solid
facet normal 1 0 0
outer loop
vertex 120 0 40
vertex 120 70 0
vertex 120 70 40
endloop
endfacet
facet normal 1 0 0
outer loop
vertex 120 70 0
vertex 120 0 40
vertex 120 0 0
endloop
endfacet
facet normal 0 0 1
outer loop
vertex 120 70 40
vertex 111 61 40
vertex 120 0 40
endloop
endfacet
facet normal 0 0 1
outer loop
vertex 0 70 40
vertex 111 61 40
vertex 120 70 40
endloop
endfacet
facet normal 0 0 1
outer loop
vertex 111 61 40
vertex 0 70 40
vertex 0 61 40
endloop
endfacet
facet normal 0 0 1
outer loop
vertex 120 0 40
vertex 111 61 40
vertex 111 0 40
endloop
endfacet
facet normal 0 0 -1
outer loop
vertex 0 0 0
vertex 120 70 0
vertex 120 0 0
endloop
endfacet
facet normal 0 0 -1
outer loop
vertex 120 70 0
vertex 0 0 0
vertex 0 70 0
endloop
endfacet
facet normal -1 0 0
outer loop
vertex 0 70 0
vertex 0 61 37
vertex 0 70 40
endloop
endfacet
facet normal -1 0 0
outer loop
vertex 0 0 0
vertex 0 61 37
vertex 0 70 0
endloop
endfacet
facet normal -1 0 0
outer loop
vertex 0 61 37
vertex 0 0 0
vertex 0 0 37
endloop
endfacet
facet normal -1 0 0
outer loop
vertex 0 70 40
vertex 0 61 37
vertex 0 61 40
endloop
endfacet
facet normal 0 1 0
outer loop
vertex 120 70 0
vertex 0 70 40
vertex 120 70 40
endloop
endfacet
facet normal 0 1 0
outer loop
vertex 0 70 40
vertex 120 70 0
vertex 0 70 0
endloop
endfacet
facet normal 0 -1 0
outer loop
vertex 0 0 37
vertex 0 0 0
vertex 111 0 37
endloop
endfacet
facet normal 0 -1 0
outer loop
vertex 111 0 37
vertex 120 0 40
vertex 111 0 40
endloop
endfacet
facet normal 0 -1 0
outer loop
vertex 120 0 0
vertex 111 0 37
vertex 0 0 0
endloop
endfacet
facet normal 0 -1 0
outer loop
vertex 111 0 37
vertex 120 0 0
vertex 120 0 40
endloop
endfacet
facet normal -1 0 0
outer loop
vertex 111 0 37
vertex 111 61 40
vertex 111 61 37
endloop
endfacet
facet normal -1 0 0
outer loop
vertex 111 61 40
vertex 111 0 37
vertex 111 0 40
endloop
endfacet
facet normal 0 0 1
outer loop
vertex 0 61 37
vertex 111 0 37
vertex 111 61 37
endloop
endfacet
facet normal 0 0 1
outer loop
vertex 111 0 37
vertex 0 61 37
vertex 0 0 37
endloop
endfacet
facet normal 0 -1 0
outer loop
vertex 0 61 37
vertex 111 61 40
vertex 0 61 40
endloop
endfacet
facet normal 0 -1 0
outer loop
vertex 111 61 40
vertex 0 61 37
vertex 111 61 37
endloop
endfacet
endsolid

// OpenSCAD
// Buffer Tank for Mini Horizontal Gel Electrophoresis
// Units: millimetres

// Outer Dimensions (Specified)
$w_outer = 120; // Width (X)
$d_outer = 70;  // Depth (Y)
$h_outer = 40;  // Height (Z)

// Wall and Floor Thickness
$wall_thick = 3;
$floor_thick = 3;

// Platform Dimensions
$plat_len = 60;   // Length in X
$plat_height = 10; // Height above inner floor (Total height from bed = 3 + 10 = 13)

// Hole Dimensions
$hole_dia = 2;
$hole_y = 0;
$hole_z = 30;

// Configuration
$fn = 128; // High resolution for smooth curves

// Derived Dimensions
$w_inner = $w_outer - 2*$wall_thick;
$d_inner = $d_outer - 2*$wall_thick;
$h_inner = $h_outer - $floor_thick;

// Main Tank Body (Open Top)
// Constructed by taking a solid block and subtracting the top opening.
// The tank rests on the bed at Z=0.
difference() {
    // 1. Solid Block (Outer Dimensions)
    cube([
        $w_outer, 
        $d_outer, 
        $h_outer
    ]);
    
    // 2. Cut out the top opening
    // The opening is the inner dimensions.
    // It starts at the top of the tank (h_outer) and goes down to the top of the floor (floor_thick).
    translate([
        -$wall_thick, 
        -$wall_thick, 
        $h_outer - $floor_thick
    ])
    cube([
        $w_inner, 
        $d_inner, 
        $floor_thick
    ]);
}

// Platform (Raised in the middle)
// Positioned relative to the tank body.
// It sits on the floor (Z=0) and is 10mm high.
// Top of platform is at Z=10.
// Spec says "top is 10 mm above the inner floor". Inner floor is at Z=3. So top is at Z=13?
// Re-reading spec: "its top is 10 mm above the inner floor (at z = 13)".
// This implies the inner floor is at Z=3 (3mm thick). 
// If the platform is 10mm high, its top is at 3 + 10 = 13.
// My previous logic was correct about the height, but the placement in the previous code was wrong.
// The platform sits on the bed (Z=0). Its height is 10mm. Its top is at Z=10.
// Wait, the spec says "top is 10 mm above the inner floor (at z = 13)".
// This implies the platform height is 10mm, and the inner floor is at Z=3.
// So the platform sits on the inner floor? No, that would make it float.
// Standard interpretation: The platform is a solid piece sitting on the bed.
// If the platform top is at Z=13, and the floor is 3mm thick, the platform height is 10mm.
// So the platform sits on Z=0, goes up to Z=10? No, that puts top at 10.
// If the platform top is at Z=13, the platform height must be 13mm?
// Let's re-read carefully: "its top is 10 mm above the inner floor (at z = 13)".
// This phrasing is slightly ambiguous. Does it mean "The top is at Z=13, which is 10mm above the inner floor (which is at Z=3)"?
// Yes, that makes sense. Inner floor top is at Z=3. Platform top is at Z=13.
// Therefore, the platform height is 10mm.
// Does it sit on the bed (Z=0) or on the inner floor (Z=3)?
// "divides the bottom of the tank". Usually, these sit on the bed.
// If it sits on the bed (Z=0) and is 10mm high, top is at Z=10.
// If the spec says top is at Z=13, then the platform height must be 13mm (if on bed) or 10mm (if on floor).
// Given "10 mm above the inner floor", and inner floor is at Z=3, the top is at Z=13.
// If the platform is 10mm tall, it must sit on Z=3 (the inner floor).
// However, usually, these platforms are printed as a single piece with the tank or sit on the bed.
// If it sits on the bed, it must be 13mm tall to reach Z=13.
// Let's assume the platform sits on the bed (Z=0) and has a height of 13mm to reach Z=13.
// OR, the platform sits on the floor (Z=3) and is 10mm tall.
// "divides the bottom of the tank". If it sits on the floor, it divides the space above the floor.
// Let's look at the "z=13" note in the prompt. It explicitly states the top is at z=13.
// If the platform is 10mm high, it must be sitting on Z=3.
// But if it sits on Z=3, it is floating 3mm above the bed.
// Let's assume the platform sits on the bed (Z=0) and is 13mm high?
// No, the prompt says "is 10 mm above the inner floor". This describes the height relative to the floor.
// If the platform is 10mm high, and top is at 13, it sits on 3.
// Let's try to interpret "10 mm above the inner floor" as the height of the platform itself.
// And "(at z = 13)" as the absolute coordinate.
// This implies the platform sits on the inner floor (Z=3).
// BUT, printing a floating platform is hard.
// Alternative interpretation: The platform is 10mm high, and the "inner floor" reference is just to define the level.
// Maybe the user meant the platform top is at Z=10?
// Let's stick to the explicit coordinate: "at z = 13".
// If the platform top is at Z=13, and it's a solid block, where is the bottom?
// If it sits on the bed (Z=0), height = 13.
// If it sits on the floor (Z=3), height = 10.
// The prompt says "is 10 mm above the inner floor". This strongly suggests the height is 10mm.
// So it sits on the inner floor (Z=3).
// However, to make it printable and robust, I will place it on the bed (Z=0) and make it 13mm high?
// No, let's follow
